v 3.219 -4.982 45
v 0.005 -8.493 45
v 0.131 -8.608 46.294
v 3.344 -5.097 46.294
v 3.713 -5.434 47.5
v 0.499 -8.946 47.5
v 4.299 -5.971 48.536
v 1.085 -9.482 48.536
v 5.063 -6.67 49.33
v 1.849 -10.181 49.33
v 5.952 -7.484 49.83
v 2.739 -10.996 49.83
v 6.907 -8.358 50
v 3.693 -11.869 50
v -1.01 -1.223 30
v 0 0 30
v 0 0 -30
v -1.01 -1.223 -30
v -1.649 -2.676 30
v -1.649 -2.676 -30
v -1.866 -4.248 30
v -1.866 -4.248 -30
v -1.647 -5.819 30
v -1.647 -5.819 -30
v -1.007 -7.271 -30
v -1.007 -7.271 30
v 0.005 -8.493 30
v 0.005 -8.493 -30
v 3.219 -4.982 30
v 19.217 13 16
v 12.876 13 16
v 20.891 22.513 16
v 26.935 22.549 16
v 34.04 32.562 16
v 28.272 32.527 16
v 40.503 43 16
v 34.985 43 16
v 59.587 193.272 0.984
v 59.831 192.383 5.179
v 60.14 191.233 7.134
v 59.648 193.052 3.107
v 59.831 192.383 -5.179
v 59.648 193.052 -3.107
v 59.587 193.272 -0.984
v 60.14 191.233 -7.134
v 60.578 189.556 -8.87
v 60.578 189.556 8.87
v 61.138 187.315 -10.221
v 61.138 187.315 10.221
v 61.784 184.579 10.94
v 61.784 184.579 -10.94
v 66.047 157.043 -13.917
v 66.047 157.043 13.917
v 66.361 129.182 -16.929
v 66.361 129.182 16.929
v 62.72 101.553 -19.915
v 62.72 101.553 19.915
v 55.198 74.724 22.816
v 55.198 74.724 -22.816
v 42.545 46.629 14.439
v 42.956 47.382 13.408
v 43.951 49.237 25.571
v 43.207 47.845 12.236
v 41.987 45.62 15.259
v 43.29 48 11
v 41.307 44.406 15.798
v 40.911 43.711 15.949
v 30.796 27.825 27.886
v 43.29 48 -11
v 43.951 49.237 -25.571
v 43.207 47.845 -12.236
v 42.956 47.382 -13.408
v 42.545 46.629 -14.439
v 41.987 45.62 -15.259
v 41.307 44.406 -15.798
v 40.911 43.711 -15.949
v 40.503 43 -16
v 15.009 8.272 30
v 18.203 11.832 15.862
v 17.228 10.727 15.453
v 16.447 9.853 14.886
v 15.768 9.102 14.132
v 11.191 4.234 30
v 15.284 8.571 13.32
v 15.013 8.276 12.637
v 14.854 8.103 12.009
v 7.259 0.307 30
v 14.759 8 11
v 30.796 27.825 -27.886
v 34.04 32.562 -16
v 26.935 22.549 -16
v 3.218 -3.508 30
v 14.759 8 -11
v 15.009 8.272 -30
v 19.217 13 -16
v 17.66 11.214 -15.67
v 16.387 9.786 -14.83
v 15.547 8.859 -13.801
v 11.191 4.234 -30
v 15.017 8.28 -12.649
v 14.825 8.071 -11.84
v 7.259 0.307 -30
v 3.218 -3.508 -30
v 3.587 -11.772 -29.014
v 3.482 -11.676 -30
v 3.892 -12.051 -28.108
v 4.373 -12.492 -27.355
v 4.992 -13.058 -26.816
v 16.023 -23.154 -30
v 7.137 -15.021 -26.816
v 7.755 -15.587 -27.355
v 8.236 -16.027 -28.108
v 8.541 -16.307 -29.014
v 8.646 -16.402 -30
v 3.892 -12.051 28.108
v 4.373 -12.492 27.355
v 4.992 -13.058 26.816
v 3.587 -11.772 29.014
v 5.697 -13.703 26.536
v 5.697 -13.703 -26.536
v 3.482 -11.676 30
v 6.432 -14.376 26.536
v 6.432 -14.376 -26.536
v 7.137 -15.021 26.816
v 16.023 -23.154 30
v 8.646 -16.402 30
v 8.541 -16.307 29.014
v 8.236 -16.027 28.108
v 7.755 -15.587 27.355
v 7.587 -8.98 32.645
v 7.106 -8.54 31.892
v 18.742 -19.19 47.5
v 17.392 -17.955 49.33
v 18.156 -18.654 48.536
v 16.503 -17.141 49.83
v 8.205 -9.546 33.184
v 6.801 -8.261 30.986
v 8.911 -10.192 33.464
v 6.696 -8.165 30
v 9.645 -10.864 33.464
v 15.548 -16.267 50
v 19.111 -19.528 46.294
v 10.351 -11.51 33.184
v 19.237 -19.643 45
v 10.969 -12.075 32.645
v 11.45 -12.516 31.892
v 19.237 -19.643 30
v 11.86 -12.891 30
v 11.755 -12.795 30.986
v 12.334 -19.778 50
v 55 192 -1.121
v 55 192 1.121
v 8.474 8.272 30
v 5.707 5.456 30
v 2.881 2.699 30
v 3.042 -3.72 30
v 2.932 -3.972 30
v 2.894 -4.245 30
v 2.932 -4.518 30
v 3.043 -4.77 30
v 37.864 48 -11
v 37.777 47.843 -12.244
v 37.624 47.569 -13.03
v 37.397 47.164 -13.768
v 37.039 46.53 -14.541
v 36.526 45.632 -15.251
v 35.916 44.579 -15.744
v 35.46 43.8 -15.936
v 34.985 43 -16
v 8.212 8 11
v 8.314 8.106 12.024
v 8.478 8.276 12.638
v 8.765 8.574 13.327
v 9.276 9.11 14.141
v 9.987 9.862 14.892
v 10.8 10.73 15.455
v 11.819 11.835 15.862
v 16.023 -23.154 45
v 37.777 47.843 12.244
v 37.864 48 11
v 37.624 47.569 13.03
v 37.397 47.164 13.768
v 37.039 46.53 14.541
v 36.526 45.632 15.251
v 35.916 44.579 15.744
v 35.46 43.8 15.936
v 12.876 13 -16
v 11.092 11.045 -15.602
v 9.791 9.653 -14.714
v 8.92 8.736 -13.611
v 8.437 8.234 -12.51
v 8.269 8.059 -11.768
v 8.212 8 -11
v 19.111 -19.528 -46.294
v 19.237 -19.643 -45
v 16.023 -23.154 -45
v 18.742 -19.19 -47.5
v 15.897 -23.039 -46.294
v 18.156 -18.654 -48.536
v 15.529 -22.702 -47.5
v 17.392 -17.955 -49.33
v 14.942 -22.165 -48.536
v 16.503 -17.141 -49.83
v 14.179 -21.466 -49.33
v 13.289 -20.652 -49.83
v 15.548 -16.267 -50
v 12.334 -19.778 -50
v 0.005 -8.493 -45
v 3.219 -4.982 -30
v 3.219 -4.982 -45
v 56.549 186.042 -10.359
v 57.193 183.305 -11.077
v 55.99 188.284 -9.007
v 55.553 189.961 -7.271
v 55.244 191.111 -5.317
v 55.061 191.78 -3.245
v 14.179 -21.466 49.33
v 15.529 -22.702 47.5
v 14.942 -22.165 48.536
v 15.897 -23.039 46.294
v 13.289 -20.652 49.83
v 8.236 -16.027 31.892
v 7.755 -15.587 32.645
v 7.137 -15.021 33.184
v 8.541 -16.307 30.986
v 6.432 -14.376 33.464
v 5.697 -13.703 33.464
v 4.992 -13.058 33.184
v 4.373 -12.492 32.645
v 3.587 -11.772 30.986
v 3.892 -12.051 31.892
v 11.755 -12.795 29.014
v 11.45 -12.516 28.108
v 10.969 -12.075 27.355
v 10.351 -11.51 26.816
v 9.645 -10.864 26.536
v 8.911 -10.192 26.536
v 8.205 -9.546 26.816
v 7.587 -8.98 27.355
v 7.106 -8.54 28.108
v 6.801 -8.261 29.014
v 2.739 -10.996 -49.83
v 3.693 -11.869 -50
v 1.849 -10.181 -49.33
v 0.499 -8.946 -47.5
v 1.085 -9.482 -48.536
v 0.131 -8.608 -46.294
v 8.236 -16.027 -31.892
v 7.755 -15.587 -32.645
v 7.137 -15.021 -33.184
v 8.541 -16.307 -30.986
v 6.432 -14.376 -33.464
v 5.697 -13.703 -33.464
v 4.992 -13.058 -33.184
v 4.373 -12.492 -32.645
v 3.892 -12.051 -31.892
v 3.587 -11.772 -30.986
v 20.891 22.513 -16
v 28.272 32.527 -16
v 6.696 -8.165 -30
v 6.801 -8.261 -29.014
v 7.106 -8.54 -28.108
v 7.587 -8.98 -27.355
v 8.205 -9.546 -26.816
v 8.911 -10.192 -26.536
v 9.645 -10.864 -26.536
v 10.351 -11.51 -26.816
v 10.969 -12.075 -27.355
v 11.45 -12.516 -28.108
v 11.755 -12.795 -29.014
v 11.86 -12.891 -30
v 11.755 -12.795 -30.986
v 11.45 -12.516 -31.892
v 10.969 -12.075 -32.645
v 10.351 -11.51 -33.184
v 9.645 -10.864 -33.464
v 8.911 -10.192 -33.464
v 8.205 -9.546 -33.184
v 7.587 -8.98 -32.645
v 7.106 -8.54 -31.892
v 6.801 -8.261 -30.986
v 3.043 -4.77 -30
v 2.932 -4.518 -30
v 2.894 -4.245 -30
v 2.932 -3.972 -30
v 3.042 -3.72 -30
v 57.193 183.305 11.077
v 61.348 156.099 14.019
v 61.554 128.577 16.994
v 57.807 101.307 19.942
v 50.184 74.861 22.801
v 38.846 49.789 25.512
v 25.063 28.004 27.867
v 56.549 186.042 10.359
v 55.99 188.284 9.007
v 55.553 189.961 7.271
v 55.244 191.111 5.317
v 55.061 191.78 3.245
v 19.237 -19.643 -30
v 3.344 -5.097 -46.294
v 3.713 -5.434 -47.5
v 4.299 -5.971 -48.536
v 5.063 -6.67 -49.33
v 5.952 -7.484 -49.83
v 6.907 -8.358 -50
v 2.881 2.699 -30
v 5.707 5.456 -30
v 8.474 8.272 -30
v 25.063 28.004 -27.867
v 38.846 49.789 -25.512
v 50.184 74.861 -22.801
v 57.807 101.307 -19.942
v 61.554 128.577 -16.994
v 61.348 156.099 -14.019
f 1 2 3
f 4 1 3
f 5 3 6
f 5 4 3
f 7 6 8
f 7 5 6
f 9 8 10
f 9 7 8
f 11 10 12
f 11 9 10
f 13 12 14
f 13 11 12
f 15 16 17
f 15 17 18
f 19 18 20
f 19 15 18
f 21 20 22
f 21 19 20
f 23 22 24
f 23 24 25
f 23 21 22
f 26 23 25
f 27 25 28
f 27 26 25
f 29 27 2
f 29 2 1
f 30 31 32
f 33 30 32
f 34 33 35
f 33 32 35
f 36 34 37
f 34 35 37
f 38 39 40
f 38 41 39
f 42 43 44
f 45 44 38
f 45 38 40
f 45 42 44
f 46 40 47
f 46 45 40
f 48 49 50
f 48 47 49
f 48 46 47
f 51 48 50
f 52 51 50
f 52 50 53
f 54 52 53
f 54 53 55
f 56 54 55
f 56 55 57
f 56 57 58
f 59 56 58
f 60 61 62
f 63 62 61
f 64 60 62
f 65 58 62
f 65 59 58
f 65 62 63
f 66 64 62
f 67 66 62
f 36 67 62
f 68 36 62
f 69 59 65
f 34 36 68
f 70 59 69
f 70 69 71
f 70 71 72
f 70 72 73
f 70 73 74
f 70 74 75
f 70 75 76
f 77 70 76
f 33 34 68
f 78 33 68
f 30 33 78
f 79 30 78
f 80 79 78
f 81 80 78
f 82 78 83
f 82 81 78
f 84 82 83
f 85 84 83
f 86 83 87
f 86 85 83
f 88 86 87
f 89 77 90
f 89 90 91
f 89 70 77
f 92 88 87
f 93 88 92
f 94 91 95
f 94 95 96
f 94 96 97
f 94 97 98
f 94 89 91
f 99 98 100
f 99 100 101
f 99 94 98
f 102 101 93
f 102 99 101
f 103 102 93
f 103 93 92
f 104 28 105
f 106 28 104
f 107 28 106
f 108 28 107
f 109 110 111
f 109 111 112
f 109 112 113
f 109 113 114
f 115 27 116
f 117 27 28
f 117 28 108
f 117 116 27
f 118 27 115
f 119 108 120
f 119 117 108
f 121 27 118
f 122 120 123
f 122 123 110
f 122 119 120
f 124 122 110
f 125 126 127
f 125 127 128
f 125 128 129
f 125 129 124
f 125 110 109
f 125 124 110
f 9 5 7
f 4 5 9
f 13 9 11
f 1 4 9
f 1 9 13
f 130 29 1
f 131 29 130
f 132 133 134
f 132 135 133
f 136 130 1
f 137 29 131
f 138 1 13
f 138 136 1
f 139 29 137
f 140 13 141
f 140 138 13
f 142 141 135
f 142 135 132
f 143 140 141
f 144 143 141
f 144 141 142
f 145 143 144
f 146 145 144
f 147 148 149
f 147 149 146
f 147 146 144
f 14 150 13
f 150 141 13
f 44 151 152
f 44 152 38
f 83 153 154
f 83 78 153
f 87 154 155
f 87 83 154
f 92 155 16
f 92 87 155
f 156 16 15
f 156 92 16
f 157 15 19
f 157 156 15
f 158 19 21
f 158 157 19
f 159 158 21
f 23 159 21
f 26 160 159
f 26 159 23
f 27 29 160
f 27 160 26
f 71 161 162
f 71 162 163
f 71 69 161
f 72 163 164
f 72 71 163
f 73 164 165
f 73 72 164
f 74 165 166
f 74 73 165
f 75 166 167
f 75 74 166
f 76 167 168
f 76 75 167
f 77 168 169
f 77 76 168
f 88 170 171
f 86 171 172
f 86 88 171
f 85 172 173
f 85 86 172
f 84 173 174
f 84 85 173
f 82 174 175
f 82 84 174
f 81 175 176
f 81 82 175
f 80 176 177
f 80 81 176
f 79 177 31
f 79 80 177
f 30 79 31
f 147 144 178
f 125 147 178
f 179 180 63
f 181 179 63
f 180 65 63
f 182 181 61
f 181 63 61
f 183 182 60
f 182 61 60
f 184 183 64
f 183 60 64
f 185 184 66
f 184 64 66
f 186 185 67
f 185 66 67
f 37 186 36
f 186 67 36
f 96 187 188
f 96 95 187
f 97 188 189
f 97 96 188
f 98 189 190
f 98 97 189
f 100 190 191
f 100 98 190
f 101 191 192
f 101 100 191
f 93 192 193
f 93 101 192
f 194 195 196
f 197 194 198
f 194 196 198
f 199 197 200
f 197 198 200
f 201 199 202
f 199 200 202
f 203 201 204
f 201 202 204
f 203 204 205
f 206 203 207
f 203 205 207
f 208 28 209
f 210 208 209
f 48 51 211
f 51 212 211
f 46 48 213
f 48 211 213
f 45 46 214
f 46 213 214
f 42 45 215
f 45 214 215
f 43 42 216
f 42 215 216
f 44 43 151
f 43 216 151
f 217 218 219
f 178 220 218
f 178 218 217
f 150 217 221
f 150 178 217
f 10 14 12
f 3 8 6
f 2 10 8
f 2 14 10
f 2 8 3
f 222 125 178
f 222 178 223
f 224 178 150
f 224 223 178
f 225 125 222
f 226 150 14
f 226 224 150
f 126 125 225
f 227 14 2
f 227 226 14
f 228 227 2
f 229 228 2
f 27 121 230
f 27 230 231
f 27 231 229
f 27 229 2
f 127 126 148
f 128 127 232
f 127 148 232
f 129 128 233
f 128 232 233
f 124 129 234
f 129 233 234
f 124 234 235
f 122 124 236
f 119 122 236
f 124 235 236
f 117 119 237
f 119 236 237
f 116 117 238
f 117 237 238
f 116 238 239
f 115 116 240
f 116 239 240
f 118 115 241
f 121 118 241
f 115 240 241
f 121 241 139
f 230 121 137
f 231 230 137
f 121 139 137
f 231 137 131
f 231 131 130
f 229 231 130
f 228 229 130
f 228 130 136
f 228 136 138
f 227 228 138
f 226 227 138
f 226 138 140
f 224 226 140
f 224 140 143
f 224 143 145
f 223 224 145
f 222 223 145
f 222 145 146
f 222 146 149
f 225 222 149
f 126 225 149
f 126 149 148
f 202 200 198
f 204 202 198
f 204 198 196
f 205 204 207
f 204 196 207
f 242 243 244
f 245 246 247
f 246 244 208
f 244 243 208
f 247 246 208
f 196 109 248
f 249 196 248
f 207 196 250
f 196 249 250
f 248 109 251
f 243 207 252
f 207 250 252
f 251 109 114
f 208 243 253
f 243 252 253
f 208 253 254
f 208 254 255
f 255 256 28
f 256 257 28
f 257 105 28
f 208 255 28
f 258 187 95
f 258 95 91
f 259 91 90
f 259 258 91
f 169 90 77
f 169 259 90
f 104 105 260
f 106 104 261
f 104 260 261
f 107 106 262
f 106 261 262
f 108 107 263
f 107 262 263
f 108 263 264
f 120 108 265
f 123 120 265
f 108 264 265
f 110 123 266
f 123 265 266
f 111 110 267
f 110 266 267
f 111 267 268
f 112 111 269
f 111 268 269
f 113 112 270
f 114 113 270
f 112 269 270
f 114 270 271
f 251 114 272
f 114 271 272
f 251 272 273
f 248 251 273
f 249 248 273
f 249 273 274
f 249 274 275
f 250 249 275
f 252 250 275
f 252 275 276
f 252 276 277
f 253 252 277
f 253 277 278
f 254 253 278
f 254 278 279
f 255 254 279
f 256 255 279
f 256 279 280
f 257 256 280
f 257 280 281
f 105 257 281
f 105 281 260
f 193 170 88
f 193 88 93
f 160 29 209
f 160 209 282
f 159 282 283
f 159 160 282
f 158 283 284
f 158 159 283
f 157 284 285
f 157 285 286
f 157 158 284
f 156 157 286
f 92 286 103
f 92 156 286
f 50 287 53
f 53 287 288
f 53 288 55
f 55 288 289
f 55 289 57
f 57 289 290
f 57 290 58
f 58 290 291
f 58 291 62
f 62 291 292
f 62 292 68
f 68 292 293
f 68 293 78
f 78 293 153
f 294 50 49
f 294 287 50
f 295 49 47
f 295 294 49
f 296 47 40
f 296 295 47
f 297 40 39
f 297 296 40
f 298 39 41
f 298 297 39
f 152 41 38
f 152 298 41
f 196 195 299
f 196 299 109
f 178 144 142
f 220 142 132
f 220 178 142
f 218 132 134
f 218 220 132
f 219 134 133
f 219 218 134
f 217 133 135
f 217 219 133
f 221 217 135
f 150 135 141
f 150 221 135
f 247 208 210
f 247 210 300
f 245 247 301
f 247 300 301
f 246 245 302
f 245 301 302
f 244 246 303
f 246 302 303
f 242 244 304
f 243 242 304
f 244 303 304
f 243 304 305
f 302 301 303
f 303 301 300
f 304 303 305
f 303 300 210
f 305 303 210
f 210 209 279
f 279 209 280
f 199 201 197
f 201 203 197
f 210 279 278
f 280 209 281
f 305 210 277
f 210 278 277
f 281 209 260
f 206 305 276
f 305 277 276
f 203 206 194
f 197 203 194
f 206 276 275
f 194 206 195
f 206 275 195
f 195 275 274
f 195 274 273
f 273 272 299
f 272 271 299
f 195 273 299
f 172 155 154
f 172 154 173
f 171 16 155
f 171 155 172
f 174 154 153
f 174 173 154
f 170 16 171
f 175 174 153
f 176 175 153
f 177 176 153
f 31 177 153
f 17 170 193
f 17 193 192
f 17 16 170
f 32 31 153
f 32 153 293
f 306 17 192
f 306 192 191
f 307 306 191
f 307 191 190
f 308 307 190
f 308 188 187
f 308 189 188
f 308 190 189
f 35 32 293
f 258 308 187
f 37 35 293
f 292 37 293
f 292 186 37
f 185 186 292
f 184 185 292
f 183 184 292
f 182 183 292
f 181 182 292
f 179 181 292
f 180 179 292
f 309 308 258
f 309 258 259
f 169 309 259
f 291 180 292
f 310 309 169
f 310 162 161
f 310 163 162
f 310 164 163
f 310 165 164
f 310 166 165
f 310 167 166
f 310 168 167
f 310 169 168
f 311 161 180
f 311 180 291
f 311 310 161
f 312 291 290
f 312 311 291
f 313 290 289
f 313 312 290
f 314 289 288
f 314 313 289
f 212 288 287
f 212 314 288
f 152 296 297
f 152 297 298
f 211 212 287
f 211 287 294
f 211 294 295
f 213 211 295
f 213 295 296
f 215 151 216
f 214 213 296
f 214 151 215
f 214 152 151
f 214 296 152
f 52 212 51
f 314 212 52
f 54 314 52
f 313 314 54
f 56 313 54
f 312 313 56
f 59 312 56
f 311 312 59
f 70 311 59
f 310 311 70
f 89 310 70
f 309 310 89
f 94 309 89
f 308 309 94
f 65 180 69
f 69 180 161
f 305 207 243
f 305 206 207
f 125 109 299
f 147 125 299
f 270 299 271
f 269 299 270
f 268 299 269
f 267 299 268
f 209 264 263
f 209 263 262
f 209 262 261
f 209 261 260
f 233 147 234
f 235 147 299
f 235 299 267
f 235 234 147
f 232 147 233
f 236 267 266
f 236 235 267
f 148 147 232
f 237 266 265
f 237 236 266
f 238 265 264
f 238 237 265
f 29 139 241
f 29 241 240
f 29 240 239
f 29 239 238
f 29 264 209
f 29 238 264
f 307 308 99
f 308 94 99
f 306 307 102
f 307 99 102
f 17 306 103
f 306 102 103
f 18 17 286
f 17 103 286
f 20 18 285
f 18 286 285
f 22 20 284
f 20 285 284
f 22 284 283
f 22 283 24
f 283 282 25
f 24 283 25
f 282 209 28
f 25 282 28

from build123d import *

# Parameters (mm, degrees)
BRIDA_BASE1_DEPTH          = 30
BRIDA_BASE1_DEPTH_BACK     = 30
BRIDA_DE_ARISTA1_DEPTH     = 60
CORTAR_EXTRUIR4_DEPTH      = 207.650630806
CORTAR_EXTRUIR4_DEPTH_BACK = 207.650630806
CROQUIS13_W                = 32
CROQUIS13_H                = 40
REDONDEO1_R                = 10
SALIENTE_EXTRUIR1_DEPTH    = 20
REDONDEO2_R                = 5
CORTAR_EXTRUIR5_REACH      = 213.826
CROQUIS18_R                = 3.5
REDONDEO3_R                = 5


# Sheet-metal steps are written as plain solids
with BuildPart() as part:
    # Croquis2 → Brida base1 (new, two sides: drawn at the far end of the back side and taken through both)
    with BuildSketch(Plane.XY.offset(-BRIDA_BASE1_DEPTH_BACK)):
        with BuildLine():
            ThreePointArc((0, 0), (54.558363857, 88.248906187), (55, 192))
            Line((55, 192), (59.586947027, 193.271816408))
            ThreePointArc((59.586947027, 193.271816408), (59.134317403, 86.938086161), (3.217852989, -3.507566413))
            Line((3.217852989, -3.507566413), (0, 0))
        make_face()
    extrude(amount=BRIDA_BASE1_DEPTH + BRIDA_BASE1_DEPTH_BACK)

    # Brida de arista1 section (across the edge) → Brida de arista1 (add)
    with BuildSketch(Plane(origin=(2.413685543, -4.245312279, 30), x_dir=(0.6751606504214892, 0.7376707233735331, 0), z_dir=(0, 0, -1))):
        with BuildLine():
            Line((-4.76, 1.091308501), (-4.76, 22.805371535))
            Line((-4.76, 22.805371535), (0, 22.805371535))
            Line((0, 22.805371535), (0, 1.091308501))
            ThreePointArc((0, 1.091308501), (0.324409792, 0.354031164), (1.087155743, 0.095113803))
            Line((1.087155743, 0.095113803), (1.502017078, -4.64677296))
            ThreePointArc((1.502017078, -4.64677296), (-2.891399596, -3.155408959), (-4.76, 1.091308501))
        make_face()
    extrude(amount=BRIDA_DE_ARISTA1_DEPTH)

    # Croquis13 → Cortar-Extruir4 (cut, two sides: drawn at the far end of the back side and taken through both)
    with BuildSketch(Plane(origin=(0, 0, 0), x_dir=(0, 0, -1), z_dir=(1, 0, 0)).offset(-CORTAR_EXTRUIR4_DEPTH_BACK)):
        Polygon((-10, 193.271816408), (-30, 8.271816408), (-30, 193.271816408), align=None)
        Polygon((30, 193.271816408), (10, 193.271816408), (30, 8.271816408), align=None)
        with Locations((0, 28)):
            Rectangle(CROQUIS13_W, CROQUIS13_H)
    extrude(amount=CORTAR_EXTRUIR4_DEPTH + CORTAR_EXTRUIR4_DEPTH_BACK, mode=Mode.SUBTRACT)

    # Redondeo1
    redondeo1_edges = [part.edges().sort_by_distance(p)[0] for p in [
        (57.293473513, 192.635908204, 10.068746833),
        (57.293473513, 192.635908204, -10.068746833),
    ]]
    fillet(redondeo1_edges, radius=REDONDEO1_R)

    # Croquis17 → Saliente-Extruir1 (add)
    with BuildSketch(Plane(origin=(0, 0, -30), x_dir=(-1, 0, 0), z_dir=(0, 0, -1))):
        Polygon((-16.022775764, -23.1539144), (-0.004947179, -8.493433479), (-3.218711875, -4.982120836), (-19.23654046, -19.642601757), align=None)
    saliente_extruir1 = extrude(amount=SALIENTE_EXTRUIR1_DEPTH)

    # Simetría1: Saliente-Extruir1 across plane
    add(saliente_extruir1.mirror(Plane.XY))

    # Redondeo2
    redondeo2_edges = [part.edges().sort_by_distance(p)[0] for p in [
        (17.629658112, -21.398258079, -50),
        (1.611829527, -6.737777158, -50),
        (17.629658112, -21.398258079, 50),
        (1.611829527, -6.737777158, 50),
    ]]
    fillet(redondeo2_edges, radius=REDONDEO2_R)

    # Croquis18 → Cortar-Extruir5 (cut, up to next)
    with BuildSketch(Plane(origin=(-1.014102827, -1.107994025, 0), x_dir=(0, 0, -1), z_dir=(0.6751606504214892, 0.7376707233735331, 0)), mode=Mode.PRIVATE) as cortar_extruir5_sk1:
        with Locations(Location((30, -13.952144495, 0), (0, 0, 90))):
            Circle(CROQUIS18_R)
    cortar_extruir5_tool1 = extrude(cortar_extruir5_sk1.sketch, amount=-CORTAR_EXTRUIR5_REACH, mode=Mode.PRIVATE) & part.part
    # Croquis18 → Cortar-Extruir5 (cut, up to next)
    with BuildSketch(Plane(origin=(-1.014102827, -1.107994025, 0), x_dir=(0, 0, -1), z_dir=(0.6751606504214892, 0.7376707233735331, 0)), mode=Mode.PRIVATE) as cortar_extruir5_sk2:
        with Locations(Location((-30, -13.952144495, 0), (0, 0, 270))):
            Circle(CROQUIS18_R)
    cortar_extruir5_tool2 = extrude(cortar_extruir5_sk2.sketch, amount=-CORTAR_EXTRUIR5_REACH, mode=Mode.PRIVATE) & part.part
    add(cortar_extruir5_tool1.solids().sort_by_distance((9.277986, -10.527933, -30))[0], mode=Mode.SUBTRACT)
    add(cortar_extruir5_tool2.solids().sort_by_distance((9.277986, -10.527933, 30))[0], mode=Mode.SUBTRACT)

    # Redondeo3
    redondeo3_edges = [part.edges().sort_by_distance(p)[0] for p in [
        (40.577357411, 48, -16),
        (11.485461299, 8, -16),
        (11.485461299, 8, 16),
        (40.577357411, 48, 16),
    ]]
    fillet(redondeo3_edges, radius=REDONDEO3_R)


solid = part.part
